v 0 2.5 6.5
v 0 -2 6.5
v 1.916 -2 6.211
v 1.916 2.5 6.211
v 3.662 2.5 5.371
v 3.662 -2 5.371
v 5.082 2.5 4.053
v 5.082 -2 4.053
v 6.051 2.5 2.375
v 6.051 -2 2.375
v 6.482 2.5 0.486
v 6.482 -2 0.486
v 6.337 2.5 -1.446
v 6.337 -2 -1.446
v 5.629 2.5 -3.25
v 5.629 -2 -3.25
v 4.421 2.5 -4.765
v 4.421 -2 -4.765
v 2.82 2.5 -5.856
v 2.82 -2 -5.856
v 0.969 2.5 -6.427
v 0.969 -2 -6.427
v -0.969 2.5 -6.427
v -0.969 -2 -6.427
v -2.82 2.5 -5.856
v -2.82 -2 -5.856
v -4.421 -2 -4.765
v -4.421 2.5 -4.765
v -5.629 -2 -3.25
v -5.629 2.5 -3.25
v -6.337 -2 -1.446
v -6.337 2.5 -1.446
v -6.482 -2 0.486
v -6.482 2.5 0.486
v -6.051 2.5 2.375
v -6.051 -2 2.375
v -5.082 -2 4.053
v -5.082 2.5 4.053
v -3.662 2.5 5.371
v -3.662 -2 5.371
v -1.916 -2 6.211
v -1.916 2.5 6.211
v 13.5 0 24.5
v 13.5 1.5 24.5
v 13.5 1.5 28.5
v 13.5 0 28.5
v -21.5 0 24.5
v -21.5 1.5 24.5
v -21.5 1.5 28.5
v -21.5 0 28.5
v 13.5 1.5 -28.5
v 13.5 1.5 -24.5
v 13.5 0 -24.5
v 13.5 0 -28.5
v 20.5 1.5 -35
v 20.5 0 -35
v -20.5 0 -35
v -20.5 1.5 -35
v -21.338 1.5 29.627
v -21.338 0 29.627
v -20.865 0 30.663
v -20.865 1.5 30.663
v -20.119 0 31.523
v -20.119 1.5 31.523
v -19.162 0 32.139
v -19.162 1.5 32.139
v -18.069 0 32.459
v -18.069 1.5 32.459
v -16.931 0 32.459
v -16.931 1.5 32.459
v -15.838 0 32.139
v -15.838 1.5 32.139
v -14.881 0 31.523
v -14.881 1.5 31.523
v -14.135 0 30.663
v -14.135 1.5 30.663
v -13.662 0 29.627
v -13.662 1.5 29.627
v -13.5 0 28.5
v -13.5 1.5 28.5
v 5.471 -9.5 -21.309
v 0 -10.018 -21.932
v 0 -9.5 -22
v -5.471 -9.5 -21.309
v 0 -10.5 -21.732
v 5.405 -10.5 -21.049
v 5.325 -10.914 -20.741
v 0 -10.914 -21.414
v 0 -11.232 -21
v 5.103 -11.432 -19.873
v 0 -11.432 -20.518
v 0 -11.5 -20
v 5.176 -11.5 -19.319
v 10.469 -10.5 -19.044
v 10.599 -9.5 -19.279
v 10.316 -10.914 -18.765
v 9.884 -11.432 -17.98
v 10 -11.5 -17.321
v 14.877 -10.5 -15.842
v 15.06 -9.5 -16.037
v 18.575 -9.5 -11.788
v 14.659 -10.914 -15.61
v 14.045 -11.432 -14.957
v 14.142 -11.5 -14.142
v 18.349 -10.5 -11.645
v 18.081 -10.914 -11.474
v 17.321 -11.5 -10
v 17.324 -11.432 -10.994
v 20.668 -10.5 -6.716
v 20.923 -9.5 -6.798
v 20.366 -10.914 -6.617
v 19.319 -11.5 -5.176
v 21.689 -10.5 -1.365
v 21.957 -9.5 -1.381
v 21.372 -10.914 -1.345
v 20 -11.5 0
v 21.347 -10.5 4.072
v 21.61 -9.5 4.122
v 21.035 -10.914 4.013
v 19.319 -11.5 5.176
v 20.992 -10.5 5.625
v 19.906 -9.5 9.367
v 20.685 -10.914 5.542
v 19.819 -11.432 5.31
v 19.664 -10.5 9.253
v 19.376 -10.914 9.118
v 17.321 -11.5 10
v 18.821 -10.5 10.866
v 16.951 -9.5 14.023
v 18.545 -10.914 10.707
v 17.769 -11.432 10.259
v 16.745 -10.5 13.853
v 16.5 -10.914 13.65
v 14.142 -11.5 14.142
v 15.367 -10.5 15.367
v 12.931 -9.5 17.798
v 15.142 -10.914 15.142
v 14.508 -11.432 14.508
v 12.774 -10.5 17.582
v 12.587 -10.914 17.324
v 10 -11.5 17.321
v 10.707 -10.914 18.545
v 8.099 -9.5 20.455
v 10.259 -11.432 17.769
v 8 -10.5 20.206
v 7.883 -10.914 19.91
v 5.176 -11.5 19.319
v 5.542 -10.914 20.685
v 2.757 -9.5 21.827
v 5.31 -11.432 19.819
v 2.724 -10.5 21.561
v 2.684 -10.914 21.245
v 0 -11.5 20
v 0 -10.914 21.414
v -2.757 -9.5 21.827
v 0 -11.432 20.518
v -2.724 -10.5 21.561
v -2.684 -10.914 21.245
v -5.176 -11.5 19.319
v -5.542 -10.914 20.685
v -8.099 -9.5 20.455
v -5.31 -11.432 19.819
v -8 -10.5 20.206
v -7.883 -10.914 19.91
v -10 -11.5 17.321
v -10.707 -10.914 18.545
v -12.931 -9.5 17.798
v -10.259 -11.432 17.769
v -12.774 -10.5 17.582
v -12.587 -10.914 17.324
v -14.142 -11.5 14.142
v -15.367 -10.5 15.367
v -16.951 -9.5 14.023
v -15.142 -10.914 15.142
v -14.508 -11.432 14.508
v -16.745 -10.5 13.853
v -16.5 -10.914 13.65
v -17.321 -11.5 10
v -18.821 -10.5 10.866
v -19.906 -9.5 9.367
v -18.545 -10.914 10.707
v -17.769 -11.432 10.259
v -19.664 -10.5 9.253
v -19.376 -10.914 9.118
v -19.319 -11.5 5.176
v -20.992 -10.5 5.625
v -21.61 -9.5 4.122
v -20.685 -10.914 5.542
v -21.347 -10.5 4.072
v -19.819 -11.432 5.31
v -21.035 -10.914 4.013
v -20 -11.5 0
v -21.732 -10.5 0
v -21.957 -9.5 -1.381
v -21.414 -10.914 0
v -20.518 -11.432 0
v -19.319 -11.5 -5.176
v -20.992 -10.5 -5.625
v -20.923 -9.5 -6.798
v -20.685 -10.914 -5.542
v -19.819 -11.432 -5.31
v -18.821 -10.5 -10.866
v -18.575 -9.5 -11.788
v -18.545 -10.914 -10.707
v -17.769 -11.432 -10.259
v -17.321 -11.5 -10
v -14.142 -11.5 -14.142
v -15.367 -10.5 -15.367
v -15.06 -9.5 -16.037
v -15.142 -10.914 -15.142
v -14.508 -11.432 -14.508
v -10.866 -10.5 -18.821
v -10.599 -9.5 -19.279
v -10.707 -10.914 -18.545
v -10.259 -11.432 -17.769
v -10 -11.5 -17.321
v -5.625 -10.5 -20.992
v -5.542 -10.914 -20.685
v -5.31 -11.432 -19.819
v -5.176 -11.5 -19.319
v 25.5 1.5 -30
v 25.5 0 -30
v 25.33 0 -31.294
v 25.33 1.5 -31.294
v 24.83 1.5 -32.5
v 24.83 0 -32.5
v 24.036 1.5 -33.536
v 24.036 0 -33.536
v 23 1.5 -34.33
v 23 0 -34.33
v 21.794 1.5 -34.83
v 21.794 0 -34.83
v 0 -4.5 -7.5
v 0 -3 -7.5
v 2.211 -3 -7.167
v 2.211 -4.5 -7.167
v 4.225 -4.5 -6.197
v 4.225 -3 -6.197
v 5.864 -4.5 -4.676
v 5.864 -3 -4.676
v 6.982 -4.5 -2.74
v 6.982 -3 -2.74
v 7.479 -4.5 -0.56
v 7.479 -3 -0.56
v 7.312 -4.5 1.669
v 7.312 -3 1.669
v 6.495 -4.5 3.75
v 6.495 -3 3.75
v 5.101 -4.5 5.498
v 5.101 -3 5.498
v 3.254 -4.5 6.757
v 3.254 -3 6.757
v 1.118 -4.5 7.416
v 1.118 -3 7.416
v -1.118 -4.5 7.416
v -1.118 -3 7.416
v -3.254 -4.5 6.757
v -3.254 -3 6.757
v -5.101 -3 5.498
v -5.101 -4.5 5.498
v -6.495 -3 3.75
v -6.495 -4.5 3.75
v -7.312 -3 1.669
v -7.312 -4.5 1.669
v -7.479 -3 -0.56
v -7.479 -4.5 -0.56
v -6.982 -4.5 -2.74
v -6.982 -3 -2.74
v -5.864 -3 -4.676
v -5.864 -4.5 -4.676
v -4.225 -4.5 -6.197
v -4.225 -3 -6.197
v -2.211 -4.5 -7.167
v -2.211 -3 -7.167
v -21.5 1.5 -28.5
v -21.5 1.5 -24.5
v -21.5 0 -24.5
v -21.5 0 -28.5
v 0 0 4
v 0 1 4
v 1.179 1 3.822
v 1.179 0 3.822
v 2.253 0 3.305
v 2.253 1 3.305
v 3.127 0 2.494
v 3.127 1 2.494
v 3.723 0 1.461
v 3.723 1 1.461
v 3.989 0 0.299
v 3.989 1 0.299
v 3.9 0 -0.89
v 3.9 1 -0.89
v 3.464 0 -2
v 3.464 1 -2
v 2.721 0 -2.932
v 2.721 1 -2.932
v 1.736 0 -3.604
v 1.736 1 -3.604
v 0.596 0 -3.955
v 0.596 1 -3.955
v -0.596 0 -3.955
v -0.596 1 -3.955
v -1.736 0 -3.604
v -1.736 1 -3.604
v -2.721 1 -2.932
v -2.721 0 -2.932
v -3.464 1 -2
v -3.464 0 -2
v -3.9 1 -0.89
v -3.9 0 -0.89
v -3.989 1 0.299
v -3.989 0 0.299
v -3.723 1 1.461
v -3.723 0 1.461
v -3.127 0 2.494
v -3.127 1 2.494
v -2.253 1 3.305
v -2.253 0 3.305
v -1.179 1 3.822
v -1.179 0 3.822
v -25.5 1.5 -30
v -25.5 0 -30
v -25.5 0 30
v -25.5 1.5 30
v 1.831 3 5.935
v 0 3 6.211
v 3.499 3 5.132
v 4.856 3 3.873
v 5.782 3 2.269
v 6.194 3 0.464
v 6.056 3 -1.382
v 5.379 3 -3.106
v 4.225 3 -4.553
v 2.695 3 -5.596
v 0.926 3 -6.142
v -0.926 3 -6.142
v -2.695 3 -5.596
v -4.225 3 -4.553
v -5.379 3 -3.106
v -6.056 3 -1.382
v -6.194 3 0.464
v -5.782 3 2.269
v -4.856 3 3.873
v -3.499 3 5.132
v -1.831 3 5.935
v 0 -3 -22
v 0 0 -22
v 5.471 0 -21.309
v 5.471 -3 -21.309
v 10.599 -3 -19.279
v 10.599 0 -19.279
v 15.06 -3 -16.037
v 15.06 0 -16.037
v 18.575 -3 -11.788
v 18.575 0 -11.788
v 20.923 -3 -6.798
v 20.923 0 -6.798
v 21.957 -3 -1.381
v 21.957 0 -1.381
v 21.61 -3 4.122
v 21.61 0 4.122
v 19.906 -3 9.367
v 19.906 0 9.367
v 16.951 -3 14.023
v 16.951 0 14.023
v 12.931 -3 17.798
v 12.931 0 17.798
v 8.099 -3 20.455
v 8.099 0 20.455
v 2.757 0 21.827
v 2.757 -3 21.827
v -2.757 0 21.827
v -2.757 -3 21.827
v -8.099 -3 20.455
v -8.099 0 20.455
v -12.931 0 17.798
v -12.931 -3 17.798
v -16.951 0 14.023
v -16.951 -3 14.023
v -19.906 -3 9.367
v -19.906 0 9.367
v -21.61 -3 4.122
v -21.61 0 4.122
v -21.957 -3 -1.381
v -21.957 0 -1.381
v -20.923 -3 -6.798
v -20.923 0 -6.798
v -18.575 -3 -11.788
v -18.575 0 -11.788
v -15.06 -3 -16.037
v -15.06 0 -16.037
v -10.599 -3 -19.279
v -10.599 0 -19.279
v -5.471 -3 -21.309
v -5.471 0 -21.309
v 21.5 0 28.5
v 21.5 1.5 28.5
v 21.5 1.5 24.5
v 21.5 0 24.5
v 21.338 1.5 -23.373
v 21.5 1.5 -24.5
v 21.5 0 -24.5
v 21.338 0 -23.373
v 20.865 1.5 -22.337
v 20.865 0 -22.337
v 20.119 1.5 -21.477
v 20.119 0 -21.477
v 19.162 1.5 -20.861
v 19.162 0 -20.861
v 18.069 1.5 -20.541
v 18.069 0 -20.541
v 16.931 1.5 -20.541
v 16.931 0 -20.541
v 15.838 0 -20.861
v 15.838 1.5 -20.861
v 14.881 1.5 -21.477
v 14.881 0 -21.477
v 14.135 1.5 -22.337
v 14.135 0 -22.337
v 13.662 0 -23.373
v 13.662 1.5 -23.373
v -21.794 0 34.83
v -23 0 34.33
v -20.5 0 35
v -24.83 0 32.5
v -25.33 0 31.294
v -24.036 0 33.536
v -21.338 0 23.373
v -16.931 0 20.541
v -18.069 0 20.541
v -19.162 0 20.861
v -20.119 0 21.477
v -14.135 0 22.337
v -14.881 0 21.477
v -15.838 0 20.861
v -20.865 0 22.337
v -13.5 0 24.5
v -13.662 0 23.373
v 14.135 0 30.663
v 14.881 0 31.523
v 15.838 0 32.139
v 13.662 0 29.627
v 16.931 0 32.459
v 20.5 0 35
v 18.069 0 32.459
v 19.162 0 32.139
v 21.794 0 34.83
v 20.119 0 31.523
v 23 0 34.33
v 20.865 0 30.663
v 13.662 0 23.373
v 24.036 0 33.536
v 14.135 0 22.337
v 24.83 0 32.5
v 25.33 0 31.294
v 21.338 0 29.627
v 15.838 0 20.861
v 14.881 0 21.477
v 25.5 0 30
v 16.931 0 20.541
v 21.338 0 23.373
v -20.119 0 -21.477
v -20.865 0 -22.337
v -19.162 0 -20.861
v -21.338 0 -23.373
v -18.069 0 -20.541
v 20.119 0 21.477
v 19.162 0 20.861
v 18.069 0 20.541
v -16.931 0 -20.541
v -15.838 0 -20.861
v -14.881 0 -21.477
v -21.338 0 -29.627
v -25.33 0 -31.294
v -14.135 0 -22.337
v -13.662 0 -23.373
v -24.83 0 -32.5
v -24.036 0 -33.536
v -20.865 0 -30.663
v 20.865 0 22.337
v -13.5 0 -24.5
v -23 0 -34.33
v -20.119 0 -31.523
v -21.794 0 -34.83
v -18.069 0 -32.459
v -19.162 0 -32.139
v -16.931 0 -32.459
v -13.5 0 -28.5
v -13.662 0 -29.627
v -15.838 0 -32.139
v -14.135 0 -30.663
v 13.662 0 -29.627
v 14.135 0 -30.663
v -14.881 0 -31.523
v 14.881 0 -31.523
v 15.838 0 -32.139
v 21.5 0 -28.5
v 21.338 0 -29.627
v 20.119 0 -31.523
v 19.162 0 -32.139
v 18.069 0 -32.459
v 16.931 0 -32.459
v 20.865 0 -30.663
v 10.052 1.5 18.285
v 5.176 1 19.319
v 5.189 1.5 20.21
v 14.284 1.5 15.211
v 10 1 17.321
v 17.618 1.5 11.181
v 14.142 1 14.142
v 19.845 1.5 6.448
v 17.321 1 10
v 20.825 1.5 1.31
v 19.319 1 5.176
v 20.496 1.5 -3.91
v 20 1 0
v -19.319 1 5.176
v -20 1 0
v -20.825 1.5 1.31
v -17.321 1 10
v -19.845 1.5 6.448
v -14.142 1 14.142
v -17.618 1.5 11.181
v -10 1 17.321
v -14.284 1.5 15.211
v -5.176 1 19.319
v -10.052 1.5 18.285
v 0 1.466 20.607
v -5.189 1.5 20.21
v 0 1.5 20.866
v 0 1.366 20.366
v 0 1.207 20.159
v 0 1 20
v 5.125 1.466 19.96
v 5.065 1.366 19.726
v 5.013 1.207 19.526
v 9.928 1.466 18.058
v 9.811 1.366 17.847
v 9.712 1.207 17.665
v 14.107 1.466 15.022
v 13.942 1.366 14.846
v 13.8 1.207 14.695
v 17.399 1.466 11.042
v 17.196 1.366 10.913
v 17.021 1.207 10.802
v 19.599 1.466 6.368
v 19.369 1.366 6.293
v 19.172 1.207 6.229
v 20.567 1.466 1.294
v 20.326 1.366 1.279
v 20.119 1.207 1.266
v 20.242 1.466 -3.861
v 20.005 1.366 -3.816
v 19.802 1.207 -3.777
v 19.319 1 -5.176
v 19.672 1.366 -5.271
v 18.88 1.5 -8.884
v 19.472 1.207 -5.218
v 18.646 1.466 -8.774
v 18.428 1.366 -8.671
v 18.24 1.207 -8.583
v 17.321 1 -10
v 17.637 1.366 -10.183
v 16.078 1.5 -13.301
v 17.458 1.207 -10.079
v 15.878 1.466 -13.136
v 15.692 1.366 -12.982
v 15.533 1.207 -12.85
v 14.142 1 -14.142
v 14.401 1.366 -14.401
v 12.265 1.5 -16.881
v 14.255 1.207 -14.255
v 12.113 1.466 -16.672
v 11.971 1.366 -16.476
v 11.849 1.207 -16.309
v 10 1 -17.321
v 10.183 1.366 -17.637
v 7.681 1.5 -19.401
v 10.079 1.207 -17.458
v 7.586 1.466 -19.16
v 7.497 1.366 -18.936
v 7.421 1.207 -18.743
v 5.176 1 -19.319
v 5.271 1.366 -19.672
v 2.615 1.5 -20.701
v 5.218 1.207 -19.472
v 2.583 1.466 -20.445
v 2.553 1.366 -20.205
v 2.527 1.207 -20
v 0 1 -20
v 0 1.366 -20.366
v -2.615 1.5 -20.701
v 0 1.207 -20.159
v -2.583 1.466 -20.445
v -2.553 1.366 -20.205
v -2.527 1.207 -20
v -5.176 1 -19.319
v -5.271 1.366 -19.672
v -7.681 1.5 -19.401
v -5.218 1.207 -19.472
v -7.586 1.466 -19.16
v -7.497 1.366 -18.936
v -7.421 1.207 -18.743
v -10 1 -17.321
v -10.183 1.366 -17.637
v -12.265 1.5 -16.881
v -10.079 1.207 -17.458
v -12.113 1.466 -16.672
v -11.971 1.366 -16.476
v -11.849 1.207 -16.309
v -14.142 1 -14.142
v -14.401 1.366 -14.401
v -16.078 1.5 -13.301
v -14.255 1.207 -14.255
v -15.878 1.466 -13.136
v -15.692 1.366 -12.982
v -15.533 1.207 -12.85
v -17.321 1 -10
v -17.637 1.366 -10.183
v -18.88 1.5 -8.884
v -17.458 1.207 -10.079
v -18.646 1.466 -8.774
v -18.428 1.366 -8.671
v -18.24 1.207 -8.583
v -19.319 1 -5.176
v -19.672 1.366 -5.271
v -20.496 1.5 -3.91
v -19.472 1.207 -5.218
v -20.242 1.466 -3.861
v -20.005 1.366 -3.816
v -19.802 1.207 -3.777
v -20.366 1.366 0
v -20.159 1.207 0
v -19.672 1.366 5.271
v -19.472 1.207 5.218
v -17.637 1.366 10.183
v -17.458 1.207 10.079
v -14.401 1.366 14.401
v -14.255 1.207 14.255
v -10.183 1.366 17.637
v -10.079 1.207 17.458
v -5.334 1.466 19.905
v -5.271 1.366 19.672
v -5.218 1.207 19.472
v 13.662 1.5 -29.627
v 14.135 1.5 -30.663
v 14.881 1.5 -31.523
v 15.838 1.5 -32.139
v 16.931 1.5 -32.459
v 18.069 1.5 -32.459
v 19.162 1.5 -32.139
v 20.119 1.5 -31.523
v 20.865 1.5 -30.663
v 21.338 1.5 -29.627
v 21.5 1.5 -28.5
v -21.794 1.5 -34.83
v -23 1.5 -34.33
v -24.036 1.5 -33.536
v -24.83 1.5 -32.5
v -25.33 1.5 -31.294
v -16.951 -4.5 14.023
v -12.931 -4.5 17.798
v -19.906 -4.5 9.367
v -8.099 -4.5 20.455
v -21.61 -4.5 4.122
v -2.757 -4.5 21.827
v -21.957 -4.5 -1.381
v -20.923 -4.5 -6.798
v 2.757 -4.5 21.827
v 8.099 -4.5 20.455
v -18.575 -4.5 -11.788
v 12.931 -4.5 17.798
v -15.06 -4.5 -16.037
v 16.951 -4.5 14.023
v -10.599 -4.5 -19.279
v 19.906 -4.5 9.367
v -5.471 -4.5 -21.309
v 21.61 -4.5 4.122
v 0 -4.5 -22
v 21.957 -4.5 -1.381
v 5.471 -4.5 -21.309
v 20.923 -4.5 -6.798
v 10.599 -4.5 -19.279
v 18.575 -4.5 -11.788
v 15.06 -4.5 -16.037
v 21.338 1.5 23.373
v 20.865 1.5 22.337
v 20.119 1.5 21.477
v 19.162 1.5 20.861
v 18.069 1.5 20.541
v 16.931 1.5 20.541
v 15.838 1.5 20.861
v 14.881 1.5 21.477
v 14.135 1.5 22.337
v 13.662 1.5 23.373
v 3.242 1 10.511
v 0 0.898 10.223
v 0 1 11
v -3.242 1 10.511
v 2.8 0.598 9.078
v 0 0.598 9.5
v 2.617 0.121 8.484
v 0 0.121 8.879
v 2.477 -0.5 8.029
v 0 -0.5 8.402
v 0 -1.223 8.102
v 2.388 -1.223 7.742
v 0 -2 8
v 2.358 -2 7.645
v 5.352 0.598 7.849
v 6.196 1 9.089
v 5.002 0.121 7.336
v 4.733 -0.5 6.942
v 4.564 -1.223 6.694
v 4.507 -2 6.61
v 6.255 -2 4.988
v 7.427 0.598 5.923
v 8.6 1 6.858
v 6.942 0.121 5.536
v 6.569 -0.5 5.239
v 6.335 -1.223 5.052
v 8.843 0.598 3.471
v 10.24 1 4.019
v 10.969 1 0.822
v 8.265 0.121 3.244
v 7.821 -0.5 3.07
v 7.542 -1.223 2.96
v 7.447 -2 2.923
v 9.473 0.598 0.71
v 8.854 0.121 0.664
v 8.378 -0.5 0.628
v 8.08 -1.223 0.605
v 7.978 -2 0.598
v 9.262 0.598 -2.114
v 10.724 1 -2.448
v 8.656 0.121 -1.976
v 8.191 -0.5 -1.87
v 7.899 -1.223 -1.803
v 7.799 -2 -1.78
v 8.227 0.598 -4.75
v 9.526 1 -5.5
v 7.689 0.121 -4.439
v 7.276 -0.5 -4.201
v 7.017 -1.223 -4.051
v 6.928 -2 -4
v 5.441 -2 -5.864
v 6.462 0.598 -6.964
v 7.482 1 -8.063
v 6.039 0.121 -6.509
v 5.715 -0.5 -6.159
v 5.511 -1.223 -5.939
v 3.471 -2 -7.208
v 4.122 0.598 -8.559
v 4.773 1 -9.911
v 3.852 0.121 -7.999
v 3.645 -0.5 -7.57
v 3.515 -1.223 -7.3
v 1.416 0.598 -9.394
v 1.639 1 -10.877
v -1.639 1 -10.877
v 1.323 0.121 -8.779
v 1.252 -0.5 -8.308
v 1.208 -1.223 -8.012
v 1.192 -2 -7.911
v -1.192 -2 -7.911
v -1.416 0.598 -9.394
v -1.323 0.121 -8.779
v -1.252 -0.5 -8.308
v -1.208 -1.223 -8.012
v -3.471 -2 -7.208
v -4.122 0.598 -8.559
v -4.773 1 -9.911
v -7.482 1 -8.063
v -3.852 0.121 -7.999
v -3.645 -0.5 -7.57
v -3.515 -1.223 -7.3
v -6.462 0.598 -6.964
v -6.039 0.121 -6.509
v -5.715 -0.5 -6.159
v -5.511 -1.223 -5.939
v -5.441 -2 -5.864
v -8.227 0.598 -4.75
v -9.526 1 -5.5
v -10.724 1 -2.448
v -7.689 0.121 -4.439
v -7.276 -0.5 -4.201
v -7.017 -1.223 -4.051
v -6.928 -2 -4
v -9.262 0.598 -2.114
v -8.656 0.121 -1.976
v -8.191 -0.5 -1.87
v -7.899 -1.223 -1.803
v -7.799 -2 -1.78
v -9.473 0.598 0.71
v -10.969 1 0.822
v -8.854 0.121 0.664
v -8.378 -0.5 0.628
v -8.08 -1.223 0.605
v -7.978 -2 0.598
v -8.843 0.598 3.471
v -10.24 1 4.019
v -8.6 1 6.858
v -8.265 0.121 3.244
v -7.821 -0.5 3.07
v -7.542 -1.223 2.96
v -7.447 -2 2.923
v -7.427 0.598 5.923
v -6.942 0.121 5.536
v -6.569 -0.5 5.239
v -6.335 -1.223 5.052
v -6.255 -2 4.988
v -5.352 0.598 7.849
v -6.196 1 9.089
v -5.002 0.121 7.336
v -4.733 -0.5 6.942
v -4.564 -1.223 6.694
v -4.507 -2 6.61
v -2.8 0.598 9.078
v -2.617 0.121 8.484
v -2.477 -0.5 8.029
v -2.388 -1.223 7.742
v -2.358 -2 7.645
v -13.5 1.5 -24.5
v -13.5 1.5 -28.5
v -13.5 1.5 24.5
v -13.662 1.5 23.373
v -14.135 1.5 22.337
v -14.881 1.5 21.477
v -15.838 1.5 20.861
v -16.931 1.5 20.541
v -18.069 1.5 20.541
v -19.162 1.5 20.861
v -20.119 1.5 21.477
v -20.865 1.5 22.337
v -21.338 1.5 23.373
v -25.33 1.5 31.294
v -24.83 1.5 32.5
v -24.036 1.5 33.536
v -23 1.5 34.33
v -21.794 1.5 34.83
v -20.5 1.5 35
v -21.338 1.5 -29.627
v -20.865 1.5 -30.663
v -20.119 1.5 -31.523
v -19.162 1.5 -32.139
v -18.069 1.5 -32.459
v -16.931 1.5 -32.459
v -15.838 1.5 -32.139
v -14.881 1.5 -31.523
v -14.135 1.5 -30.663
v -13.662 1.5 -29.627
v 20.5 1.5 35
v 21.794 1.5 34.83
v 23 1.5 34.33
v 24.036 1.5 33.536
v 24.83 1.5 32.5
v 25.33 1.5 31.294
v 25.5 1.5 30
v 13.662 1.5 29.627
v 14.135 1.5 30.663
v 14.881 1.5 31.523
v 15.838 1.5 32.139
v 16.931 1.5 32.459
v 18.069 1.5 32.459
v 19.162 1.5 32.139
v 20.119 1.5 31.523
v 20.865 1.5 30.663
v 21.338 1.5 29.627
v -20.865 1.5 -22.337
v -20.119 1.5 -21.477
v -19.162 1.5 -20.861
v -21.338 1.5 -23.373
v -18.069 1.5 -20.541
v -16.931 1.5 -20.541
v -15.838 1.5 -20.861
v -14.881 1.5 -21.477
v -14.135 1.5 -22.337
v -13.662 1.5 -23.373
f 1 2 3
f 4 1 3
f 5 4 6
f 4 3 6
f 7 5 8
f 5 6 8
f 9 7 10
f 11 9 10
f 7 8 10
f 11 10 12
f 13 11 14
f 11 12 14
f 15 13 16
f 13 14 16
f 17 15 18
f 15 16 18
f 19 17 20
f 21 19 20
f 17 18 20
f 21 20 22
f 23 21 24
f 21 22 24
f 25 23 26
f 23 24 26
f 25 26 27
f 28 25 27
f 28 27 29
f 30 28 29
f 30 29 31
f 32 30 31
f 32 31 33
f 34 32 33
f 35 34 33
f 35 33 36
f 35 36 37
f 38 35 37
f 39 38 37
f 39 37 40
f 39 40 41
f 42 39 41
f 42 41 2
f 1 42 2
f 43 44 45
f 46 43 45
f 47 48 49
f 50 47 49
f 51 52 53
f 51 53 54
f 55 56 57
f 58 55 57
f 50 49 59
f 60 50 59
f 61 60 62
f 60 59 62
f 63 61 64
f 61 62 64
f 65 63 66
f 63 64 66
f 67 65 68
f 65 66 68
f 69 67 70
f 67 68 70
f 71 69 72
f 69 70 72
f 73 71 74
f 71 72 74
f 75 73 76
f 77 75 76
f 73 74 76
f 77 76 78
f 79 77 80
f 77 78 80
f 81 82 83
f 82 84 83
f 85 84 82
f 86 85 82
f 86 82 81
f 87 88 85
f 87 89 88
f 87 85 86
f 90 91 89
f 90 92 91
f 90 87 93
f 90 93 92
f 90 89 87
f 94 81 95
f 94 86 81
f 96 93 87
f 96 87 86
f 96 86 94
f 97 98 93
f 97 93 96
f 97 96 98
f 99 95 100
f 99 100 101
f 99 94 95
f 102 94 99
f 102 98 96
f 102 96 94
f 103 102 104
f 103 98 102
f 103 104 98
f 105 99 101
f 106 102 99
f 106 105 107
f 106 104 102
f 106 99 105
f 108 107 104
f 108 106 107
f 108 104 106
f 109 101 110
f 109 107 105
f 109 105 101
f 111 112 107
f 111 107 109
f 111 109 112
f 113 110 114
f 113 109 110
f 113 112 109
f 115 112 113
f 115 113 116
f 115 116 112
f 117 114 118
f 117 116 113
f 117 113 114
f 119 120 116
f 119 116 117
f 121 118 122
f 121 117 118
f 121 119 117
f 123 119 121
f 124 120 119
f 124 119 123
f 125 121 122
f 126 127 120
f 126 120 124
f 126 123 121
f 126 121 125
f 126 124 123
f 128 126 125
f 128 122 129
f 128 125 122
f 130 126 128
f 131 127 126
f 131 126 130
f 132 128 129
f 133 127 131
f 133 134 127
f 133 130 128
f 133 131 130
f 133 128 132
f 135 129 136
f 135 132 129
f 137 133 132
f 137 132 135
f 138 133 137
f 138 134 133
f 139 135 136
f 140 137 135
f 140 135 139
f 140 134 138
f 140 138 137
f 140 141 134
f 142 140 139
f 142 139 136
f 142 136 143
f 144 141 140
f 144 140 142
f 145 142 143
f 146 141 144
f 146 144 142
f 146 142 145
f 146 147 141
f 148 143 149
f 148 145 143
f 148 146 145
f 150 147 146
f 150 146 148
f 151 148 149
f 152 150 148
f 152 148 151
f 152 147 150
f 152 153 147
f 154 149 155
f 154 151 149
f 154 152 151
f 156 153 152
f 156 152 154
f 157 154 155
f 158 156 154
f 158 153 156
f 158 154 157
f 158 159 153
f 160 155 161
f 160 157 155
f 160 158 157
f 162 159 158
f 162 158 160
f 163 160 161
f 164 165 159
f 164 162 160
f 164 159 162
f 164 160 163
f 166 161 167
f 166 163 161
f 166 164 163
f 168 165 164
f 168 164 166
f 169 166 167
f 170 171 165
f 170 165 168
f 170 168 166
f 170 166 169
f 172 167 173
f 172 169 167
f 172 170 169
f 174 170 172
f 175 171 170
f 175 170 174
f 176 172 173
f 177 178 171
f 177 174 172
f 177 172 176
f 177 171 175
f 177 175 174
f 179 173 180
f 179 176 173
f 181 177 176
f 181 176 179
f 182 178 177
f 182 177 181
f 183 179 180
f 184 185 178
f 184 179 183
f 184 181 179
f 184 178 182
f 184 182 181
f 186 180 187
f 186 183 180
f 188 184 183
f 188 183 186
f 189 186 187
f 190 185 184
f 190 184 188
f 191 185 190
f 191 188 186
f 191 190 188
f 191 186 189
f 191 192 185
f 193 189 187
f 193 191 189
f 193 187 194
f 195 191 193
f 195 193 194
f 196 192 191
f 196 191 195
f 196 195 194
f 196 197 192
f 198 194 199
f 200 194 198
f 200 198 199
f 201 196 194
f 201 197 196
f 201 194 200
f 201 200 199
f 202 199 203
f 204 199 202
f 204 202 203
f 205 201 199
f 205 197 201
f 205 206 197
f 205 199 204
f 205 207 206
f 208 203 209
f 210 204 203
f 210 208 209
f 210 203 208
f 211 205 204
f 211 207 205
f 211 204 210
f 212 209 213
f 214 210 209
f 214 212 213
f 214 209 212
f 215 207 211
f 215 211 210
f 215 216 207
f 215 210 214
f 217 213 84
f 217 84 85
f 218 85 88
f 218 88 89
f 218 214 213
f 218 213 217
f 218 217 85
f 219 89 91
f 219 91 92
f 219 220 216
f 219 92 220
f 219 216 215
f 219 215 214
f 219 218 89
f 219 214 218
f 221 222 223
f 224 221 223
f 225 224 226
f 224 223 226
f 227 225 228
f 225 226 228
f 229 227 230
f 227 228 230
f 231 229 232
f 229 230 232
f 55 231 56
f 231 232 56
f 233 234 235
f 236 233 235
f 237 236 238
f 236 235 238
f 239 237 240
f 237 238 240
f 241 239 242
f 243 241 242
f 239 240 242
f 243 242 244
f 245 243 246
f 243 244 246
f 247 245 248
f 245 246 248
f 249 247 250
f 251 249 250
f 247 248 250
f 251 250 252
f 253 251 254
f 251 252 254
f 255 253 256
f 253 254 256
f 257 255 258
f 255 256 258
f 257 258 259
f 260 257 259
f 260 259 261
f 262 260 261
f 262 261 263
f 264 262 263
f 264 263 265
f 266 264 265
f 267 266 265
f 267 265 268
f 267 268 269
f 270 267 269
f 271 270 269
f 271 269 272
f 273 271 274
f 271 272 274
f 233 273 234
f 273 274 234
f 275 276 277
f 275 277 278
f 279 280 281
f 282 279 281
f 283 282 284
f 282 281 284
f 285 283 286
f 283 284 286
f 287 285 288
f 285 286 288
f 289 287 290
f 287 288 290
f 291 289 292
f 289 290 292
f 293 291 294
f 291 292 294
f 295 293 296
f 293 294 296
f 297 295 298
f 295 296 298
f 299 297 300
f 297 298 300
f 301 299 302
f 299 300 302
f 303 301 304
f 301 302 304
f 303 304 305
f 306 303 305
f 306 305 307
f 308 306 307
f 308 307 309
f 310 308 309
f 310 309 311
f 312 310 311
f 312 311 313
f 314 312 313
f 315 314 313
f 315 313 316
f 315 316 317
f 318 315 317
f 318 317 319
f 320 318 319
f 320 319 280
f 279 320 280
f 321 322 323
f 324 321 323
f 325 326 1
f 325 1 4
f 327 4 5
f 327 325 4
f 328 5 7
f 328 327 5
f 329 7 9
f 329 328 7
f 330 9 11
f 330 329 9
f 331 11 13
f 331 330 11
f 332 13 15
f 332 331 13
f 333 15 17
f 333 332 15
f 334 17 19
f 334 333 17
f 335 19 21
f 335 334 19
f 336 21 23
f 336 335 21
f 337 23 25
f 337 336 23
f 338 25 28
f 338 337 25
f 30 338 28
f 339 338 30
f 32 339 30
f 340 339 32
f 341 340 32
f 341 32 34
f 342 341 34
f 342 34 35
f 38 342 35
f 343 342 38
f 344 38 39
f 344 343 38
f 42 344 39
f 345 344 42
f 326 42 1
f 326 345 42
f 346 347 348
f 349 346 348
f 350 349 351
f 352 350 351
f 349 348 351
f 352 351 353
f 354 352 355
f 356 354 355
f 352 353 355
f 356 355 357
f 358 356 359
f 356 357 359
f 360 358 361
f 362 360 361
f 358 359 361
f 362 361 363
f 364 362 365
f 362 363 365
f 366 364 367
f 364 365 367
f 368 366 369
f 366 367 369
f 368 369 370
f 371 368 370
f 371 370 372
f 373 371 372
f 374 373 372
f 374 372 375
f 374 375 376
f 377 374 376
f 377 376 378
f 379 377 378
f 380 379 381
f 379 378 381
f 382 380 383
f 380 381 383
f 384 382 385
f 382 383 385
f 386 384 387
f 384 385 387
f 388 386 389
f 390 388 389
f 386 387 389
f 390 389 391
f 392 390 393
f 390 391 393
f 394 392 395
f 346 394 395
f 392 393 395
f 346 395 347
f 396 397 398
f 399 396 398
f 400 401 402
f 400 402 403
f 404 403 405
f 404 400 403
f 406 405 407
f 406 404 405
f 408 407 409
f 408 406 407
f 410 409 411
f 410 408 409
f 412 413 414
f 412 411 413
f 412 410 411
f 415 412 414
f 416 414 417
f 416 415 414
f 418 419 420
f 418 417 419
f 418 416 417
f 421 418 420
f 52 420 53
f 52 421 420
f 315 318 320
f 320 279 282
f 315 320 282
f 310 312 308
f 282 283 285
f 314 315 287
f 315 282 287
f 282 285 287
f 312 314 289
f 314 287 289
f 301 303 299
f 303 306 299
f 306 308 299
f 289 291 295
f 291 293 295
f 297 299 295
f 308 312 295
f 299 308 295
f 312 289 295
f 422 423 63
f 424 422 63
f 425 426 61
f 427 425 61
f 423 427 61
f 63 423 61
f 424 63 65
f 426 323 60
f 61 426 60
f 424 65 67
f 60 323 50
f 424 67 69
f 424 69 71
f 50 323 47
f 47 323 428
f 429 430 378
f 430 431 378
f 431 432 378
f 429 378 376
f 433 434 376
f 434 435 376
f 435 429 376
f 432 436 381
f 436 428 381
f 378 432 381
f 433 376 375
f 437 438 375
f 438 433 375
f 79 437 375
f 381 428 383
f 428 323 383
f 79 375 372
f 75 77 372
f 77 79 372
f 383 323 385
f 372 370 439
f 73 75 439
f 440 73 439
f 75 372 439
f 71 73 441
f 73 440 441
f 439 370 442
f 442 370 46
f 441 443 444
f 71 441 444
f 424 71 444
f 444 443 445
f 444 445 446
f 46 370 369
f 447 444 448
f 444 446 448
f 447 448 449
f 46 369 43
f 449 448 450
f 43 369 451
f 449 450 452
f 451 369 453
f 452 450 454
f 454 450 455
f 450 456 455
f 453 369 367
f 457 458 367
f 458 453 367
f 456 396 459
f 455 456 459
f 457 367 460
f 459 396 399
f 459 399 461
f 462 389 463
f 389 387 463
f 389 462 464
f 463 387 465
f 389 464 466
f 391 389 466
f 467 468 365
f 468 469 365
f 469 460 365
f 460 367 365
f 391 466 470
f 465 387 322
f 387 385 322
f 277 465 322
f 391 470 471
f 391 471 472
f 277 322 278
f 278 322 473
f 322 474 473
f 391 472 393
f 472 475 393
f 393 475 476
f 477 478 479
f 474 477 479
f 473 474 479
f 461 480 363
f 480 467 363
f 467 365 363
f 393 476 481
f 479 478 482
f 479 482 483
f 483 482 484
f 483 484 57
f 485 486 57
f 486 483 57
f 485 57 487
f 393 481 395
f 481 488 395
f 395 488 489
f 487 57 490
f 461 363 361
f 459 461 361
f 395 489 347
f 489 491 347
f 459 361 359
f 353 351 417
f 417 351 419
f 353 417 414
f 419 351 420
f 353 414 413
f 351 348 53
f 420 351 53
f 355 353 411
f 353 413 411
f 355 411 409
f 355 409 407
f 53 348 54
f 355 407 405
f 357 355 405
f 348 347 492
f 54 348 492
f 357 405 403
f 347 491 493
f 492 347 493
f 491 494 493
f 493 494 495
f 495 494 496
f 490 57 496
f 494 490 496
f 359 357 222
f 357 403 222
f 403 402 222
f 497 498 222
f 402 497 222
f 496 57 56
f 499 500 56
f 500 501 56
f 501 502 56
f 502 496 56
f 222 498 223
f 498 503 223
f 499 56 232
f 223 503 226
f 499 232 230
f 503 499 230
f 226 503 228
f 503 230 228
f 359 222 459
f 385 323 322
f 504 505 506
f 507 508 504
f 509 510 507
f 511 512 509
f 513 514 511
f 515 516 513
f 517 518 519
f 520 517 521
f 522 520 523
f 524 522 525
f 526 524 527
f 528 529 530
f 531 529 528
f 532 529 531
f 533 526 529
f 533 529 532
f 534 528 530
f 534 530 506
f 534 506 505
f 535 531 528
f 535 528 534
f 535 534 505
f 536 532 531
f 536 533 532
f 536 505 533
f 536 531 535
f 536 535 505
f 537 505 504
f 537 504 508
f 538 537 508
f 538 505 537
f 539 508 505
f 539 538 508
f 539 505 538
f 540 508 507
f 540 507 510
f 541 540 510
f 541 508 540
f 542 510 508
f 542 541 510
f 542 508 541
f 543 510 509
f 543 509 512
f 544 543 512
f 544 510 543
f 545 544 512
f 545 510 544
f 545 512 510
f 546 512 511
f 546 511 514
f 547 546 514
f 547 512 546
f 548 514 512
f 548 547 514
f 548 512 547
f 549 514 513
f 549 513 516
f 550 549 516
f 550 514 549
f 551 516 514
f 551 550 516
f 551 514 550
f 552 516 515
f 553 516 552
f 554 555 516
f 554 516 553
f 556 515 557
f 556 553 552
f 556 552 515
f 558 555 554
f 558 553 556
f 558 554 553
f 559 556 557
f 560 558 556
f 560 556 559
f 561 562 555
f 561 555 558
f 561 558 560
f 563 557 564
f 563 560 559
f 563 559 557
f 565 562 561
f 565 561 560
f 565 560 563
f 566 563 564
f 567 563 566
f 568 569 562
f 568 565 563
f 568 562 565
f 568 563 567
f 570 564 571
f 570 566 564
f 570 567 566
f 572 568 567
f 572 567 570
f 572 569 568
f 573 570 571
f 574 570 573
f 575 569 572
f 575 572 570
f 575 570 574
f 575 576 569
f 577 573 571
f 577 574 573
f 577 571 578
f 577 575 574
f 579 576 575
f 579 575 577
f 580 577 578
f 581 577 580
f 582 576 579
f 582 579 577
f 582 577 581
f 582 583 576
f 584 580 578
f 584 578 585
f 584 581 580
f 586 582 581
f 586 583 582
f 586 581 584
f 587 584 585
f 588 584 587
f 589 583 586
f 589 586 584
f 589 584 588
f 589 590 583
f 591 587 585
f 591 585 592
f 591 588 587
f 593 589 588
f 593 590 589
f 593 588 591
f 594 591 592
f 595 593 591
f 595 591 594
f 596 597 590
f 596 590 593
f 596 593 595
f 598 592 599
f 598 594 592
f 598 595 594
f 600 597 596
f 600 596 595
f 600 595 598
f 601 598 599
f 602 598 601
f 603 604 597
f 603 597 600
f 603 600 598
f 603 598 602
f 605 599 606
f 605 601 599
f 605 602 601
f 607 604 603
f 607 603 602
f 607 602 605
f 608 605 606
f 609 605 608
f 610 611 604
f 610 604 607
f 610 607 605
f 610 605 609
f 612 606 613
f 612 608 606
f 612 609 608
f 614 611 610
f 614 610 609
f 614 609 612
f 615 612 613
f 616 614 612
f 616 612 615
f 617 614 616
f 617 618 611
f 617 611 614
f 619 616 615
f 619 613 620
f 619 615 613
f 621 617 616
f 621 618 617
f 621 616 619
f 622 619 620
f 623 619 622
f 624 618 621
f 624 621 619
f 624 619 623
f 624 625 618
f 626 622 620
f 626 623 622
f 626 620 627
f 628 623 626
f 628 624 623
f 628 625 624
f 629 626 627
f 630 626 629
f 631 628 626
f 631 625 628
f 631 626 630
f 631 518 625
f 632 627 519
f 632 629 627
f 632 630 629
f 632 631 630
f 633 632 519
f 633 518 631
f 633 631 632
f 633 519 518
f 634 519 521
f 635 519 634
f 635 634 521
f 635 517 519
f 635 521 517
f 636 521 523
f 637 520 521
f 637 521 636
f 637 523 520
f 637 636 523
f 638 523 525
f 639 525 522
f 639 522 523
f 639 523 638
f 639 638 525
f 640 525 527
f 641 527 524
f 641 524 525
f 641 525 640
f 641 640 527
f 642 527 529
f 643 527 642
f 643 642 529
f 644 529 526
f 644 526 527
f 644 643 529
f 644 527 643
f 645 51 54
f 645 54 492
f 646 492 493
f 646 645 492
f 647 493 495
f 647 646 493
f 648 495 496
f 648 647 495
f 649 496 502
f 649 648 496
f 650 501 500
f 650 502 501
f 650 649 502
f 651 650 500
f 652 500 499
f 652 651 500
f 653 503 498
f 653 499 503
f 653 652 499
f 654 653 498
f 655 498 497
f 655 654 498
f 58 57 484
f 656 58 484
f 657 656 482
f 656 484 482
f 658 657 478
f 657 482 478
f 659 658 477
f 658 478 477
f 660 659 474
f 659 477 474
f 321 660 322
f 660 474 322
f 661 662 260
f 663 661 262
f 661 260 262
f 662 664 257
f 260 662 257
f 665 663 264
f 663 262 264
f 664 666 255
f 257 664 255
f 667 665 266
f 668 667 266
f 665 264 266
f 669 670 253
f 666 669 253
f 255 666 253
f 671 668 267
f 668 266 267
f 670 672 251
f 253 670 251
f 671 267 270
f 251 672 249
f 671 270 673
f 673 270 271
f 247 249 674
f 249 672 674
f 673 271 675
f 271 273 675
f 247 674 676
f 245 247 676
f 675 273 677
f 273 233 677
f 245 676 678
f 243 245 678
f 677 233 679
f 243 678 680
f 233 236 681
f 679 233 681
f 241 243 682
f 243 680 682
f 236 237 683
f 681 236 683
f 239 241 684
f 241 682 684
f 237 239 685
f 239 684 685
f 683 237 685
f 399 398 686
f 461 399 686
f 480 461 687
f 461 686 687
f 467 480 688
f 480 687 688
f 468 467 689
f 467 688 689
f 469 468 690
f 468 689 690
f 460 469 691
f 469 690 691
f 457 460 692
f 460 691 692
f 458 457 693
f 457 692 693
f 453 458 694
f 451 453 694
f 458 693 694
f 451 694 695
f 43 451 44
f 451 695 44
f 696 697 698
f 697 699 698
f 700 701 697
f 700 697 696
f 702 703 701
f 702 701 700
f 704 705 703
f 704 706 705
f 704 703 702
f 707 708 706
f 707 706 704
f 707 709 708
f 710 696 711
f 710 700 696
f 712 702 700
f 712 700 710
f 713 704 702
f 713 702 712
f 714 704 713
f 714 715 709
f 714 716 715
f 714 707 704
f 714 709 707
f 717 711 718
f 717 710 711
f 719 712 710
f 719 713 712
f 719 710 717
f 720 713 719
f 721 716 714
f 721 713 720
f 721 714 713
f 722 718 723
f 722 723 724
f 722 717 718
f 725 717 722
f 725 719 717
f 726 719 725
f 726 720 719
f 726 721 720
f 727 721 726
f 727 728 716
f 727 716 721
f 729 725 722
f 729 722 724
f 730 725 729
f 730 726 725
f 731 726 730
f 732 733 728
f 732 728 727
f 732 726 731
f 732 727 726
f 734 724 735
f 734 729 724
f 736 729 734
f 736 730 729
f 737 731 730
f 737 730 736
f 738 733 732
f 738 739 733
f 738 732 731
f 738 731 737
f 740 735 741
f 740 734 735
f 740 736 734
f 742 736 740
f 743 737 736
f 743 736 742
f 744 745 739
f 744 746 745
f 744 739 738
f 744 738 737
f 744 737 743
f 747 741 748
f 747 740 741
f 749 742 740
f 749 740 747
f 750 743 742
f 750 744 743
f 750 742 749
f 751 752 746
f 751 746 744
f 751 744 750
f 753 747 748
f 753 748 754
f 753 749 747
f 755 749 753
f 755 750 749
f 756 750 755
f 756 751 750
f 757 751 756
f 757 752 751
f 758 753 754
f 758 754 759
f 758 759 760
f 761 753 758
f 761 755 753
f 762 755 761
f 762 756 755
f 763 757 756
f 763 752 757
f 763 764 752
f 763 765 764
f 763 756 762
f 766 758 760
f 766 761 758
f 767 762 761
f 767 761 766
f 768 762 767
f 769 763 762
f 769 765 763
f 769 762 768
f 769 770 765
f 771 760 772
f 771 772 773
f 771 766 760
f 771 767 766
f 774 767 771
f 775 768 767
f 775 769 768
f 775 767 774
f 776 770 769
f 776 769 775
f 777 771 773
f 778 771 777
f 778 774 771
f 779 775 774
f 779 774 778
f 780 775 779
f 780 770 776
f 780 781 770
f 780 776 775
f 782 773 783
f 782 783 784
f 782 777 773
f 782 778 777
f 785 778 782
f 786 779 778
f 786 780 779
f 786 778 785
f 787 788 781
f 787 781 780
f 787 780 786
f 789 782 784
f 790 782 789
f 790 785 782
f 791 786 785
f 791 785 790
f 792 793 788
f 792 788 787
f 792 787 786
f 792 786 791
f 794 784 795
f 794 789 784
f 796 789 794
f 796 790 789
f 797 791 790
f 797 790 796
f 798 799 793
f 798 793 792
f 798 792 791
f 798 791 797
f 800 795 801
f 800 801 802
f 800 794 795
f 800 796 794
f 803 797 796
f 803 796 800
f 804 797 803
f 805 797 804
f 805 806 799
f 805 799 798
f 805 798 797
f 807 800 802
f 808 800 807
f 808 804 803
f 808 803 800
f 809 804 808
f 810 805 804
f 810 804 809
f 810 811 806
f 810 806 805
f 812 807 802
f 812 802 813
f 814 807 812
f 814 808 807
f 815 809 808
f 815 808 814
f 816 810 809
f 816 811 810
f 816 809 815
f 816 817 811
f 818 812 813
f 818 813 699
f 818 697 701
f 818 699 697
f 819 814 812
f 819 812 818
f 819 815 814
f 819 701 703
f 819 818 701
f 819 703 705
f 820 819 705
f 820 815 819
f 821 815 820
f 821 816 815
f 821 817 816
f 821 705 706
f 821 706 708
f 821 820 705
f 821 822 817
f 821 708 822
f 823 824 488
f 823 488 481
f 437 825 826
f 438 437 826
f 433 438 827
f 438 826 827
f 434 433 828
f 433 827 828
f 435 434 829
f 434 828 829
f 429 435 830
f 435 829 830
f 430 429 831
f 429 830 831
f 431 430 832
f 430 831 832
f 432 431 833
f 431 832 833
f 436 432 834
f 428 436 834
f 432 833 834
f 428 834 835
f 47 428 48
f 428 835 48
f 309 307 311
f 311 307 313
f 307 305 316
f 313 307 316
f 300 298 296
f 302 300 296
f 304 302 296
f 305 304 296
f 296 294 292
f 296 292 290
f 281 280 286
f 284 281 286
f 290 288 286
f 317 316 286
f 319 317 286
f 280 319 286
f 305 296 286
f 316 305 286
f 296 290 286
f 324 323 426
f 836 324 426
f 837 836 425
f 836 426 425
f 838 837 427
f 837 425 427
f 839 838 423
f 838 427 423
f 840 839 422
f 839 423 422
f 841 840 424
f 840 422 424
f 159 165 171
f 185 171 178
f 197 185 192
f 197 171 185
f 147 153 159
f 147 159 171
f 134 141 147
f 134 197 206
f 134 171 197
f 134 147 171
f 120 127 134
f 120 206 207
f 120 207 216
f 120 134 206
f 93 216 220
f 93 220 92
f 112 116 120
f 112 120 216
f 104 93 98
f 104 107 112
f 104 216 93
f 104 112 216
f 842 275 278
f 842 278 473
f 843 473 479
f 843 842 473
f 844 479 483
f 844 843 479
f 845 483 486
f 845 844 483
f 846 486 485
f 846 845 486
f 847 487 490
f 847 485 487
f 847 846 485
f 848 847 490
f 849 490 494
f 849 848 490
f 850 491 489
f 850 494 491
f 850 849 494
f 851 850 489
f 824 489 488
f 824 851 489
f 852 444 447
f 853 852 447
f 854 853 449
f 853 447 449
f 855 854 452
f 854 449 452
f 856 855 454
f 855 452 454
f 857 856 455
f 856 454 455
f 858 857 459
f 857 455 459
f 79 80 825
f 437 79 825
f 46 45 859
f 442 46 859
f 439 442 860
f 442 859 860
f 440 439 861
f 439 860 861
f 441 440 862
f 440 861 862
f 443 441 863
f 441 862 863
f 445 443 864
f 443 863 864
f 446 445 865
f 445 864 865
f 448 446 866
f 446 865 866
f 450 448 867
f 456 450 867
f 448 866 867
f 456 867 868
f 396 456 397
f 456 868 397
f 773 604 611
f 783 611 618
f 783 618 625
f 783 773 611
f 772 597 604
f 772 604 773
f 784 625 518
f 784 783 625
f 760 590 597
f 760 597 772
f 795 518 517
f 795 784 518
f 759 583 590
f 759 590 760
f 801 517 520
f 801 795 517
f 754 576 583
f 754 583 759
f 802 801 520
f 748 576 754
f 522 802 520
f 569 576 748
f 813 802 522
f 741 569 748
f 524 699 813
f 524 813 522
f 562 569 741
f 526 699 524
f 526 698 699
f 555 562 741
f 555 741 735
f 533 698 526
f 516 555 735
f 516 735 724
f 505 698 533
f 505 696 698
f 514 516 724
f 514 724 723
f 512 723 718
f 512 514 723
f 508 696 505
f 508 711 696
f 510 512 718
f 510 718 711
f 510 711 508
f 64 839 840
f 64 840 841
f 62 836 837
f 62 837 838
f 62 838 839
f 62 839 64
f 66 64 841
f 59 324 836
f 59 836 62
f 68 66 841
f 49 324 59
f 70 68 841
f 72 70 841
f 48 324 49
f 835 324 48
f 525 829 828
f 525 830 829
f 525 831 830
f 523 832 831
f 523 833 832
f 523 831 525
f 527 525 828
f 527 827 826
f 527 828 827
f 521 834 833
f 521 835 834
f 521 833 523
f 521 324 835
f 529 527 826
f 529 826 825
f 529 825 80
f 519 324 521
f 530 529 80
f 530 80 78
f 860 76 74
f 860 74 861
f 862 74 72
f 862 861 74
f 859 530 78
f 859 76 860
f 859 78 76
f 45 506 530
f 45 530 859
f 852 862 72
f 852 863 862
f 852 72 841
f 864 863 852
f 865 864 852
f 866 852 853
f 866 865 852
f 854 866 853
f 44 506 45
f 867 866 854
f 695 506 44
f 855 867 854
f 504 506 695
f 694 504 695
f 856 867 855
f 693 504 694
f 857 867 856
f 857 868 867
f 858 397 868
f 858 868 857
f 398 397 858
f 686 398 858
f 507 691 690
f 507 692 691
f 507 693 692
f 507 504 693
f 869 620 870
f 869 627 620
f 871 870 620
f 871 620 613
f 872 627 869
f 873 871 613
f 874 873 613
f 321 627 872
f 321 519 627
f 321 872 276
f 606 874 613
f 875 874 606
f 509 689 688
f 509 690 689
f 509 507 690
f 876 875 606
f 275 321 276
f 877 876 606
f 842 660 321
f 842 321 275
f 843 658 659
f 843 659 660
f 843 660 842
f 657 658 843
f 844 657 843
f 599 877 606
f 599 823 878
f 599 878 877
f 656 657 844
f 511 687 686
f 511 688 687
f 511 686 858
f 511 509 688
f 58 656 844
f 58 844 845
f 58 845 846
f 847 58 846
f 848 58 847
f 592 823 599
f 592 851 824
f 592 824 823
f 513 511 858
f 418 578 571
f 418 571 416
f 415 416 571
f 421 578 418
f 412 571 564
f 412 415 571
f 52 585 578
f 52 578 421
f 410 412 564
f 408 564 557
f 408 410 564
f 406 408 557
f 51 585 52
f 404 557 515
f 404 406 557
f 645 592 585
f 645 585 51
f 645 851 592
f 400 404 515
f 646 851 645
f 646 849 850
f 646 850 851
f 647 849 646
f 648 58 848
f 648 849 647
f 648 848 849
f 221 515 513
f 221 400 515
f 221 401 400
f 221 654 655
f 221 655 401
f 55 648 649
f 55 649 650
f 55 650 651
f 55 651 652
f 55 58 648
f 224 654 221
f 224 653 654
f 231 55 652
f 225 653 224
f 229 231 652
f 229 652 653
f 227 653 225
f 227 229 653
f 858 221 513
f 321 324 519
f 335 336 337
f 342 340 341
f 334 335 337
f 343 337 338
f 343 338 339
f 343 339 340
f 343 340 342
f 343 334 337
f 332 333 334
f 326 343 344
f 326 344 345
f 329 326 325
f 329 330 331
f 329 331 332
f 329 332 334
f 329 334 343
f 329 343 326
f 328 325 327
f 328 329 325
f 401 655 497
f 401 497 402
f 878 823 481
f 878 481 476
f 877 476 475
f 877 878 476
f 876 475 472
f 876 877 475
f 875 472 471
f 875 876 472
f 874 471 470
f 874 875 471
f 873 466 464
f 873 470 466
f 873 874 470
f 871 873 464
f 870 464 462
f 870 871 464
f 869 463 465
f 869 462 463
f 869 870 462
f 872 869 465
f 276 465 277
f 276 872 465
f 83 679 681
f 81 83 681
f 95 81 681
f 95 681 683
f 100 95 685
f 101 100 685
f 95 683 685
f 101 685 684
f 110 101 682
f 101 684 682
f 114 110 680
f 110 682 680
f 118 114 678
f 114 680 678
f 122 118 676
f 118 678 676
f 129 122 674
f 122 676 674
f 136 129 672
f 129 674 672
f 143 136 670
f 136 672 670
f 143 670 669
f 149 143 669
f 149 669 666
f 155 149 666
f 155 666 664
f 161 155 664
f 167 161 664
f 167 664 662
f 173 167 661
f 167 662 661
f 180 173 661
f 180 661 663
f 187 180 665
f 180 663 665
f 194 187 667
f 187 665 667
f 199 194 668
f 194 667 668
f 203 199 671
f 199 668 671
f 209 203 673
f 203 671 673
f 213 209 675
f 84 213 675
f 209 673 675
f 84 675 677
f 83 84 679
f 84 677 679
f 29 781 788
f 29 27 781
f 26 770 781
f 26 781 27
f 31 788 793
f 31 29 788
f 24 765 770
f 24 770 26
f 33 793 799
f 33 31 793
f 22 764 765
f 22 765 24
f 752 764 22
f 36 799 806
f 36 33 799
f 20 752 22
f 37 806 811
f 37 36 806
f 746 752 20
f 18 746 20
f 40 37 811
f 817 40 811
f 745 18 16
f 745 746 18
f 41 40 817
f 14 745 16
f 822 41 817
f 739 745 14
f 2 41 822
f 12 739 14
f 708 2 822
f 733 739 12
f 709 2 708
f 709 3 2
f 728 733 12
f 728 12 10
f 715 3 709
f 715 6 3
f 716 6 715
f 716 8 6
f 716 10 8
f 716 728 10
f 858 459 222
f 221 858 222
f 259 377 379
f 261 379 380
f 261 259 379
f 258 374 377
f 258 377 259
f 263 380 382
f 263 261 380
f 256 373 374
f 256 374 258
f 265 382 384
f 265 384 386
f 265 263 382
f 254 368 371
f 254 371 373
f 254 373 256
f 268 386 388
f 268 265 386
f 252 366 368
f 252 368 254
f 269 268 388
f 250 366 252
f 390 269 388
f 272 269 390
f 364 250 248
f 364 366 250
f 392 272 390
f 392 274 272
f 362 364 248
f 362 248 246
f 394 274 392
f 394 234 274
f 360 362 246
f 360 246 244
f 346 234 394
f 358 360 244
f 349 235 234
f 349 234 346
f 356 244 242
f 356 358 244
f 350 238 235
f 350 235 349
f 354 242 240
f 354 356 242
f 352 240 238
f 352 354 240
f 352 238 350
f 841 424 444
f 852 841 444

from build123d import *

# Parameters (mm, degrees)
BOSS_EXTRUDE1_DEPTH = 1.5
CUT_EXTRUDE1_DEPTH  = 2
SKETCH3_R           = 4
CUT_EXTRUDE2_DEPTH  = 2
SKETCH4_R           = 20
CUT_EXTRUDE3_DEPTH  = 0.5
FILLET1_R           = 1
SKETCH5_R           = 22
BOSS_EXTRUDE2_DEPTH = 3
SKETCH6_R           = 6.5
BOSS_EXTRUDE3_DEPTH = 2
CHAMFER1_SIZE       = 0.5
CHAMFER1_SIZE2      = 0.288675135
SKETCH7_R           = 7.5
BOSS_EXTRUDE4_DEPTH = 1.5
SKETCH8_R           = 22
BOSS_EXTRUDE5_DEPTH = 7
FILLET3_R           = 2
CUT_EXTRUDE4_START  = -3
SKETCH9_R           = 8
SKETCH9_R_2         = 6.5
CUT_EXTRUDE4_DEPTH  = 3
FILLET4_R           = 3


# Some blends are built 0.0001 mm under size
with BuildPart() as part:
    # Sketch1 → Boss-Extrude1 (new body)
    with BuildSketch(Plane(origin=(0, 0, 0), x_dir=(1, 0, 0), z_dir=(0, 1, 0))):
        with BuildLine():
            Line((-20.5, -35), (20.5, -35))
            ThreePointArc((20.5, -35), (24.035533906, -33.535533906), (25.5, -30))
            Line((25.5, -30), (25.5, 30))
            ThreePointArc((25.5, 30), (24.035533906, 33.535533906), (20.5, 35))
            Line((20.5, 35), (-20.5, 35))
            ThreePointArc((-20.5, 35), (-24.035533906, 33.535533906), (-25.5, 30))
            Line((-25.5, 30), (-25.5, -30))
            ThreePointArc((-25.5, -30), (-24.035533906, -33.535533906), (-20.5, -35))
        make_face()
    extrude(amount=BOSS_EXTRUDE1_DEPTH)

    # Sketch2 → Cut-Extrude1 (cut)
    with BuildSketch(Plane(origin=(0, 1.5, 0), x_dir=(1, 0, 0), z_dir=(0, 1, 0))):
        with BuildLine():
            Line((-21.5, 24.5), (-21.5, 28.5))
            ThreePointArc((-21.5, 28.5), (-17.5, 32.5), (-13.5, 28.5))
            Line((-13.5, 28.5), (-13.5, 24.5))
            ThreePointArc((-13.5, 24.5), (-17.5, 20.5), (-21.5, 24.5))
        make_face()
        with BuildLine():
            Line((13.5, 24.5), (13.5, 28.5))
            ThreePointArc((13.5, 28.5), (17.5, 32.5), (21.5, 28.5))
            Line((21.5, 28.5), (21.5, 24.5))
            ThreePointArc((21.5, 24.5), (17.5, 20.5), (13.5, 24.5))
        make_face()
    cut_extrude1 = extrude(amount=-CUT_EXTRUDE1_DEPTH, mode=Mode.SUBTRACT)

    # Mirror1: Cut-Extrude1 across plane
    add(cut_extrude1.mirror(Plane.XY), mode=Mode.SUBTRACT)

    # Sketch3 → Cut-Extrude2 (cut)
    with BuildSketch(Plane(origin=(0, 1.5, 0), x_dir=(1, 0, 0), z_dir=(0, 1, 0))):
        with Locations(Location((0, 0, 0), (0, 0, 270))):
            Circle(SKETCH3_R)
    extrude(amount=-CUT_EXTRUDE2_DEPTH, mode=Mode.SUBTRACT)

    # Sketch4 → Cut-Extrude3 (cut)
    with BuildSketch(Plane(origin=(0, 1.5, 0), x_dir=(1, 0, 0), z_dir=(0, 1, 0))):
        with Locations(Location((0, 0, 0), (0, 0, 270))):
            Circle(SKETCH4_R)
    extrude(amount=-CUT_EXTRUDE3_DEPTH, mode=Mode.SUBTRACT)

    # Fillet1
    # the kernel refuses this fillet: 1 mm, written as the material it takes off along each edge
    with BuildSketch(Plane(origin=(0, 1.5, 0), x_dir=(0, 0, 1), z_dir=(-1, 0, 0))) as fillet1_piece_1:
        with BuildLine():
            CenterArc((20.866025404, -1), FILLET1_R, 90, 60)
            Line((20, -0.5), (19.982679492, -0.49))
            ThreePointArc((19.982679492, -0.49), (19.98, -0.25), (19.98, 0))
            Line((19.98, 0), (20, 0.02))
            Line((20, 0.02), (20.866025404, 0.02))
            Line((20.866025404, 0.02), (20.866025404, 0))
        make_face()
    revolve(axis=Axis((0, 1.5, 0), (0, 1, 0)), mode=Mode.SUBTRACT)

    # Sketch5 → Boss-Extrude2 (add)
    with BuildSketch(Plane.XZ):
        with Locations(Location((0, 0, 0), (0, 0, 270))):
            Circle(SKETCH5_R)
    extrude(amount=BOSS_EXTRUDE2_DEPTH)

    # Sketch6 → Boss-Extrude3 (add)
    with BuildSketch(Plane(origin=(0, 1, 0), x_dir=(1, 0, 0), z_dir=(0, 1, 0))):
        with Locations(Location((0, 0, 0), (0, 0, 270))):
            Circle(SKETCH6_R)
    extrude(amount=BOSS_EXTRUDE3_DEPTH)

    # Chamfer1
    chamfer1_edges = [part.edges().sort_by_distance(p)[0] for p in [
        (0, 3, -6.5),
    ]]
    chamfer1_side = [part.faces().sort_by_distance(p)[0] for p in [
        (0, 2, -6.5),
    ]]
    chamfer(chamfer1_edges, length=CHAMFER1_SIZE, length2=CHAMFER1_SIZE2, reference=chamfer1_side[0])

    # Sketch7 → Boss-Extrude4 (add)
    with BuildSketch(Plane.XZ.offset(3)):
        with Locations(Location((0, 0, 0), (0, 0, 270))):
            Circle(SKETCH7_R)
    extrude(amount=BOSS_EXTRUDE4_DEPTH)

    # Sketch8 → Boss-Extrude5 (add)
    with BuildSketch(Plane.XZ.offset(4.5)):
        with Locations(Location((0, 0, 0), (0, 0, 270))):
            Circle(SKETCH8_R)
    extrude(amount=BOSS_EXTRUDE5_DEPTH)

    # Fillet3
    fillet3_edges = [part.edges().sort_by_distance(p)[0] for p in [
        (0, -11.5, 22),
    ]]
    fillet(fillet3_edges, radius=FILLET3_R)

    # Sketch9 → Cut-Extrude4 (cut)
    with BuildSketch(Plane(origin=(0, 1, 0), x_dir=(1, 0, 0), z_dir=(0, 1, 0)).offset(CUT_EXTRUDE4_START)):
        with Locations(Location((0, 0, 0), (0, 0, 270))):
            Circle(SKETCH9_R)
        with Locations(Location((0, 0, 0), (0, 0, 270))):
            Circle(SKETCH9_R_2, mode=Mode.SUBTRACT)
    extrude(amount=CUT_EXTRUDE4_DEPTH, mode=Mode.SUBTRACT)

    # Fillet4
    fillet4_edges = [part.edges().sort_by_distance(p)[0] for p in [
        (0, 1, -8),
    ]]
    fillet(fillet4_edges, radius=FILLET4_R - 0.0001)  # a hair under: the kernel refuses the full size


solid = part.part
